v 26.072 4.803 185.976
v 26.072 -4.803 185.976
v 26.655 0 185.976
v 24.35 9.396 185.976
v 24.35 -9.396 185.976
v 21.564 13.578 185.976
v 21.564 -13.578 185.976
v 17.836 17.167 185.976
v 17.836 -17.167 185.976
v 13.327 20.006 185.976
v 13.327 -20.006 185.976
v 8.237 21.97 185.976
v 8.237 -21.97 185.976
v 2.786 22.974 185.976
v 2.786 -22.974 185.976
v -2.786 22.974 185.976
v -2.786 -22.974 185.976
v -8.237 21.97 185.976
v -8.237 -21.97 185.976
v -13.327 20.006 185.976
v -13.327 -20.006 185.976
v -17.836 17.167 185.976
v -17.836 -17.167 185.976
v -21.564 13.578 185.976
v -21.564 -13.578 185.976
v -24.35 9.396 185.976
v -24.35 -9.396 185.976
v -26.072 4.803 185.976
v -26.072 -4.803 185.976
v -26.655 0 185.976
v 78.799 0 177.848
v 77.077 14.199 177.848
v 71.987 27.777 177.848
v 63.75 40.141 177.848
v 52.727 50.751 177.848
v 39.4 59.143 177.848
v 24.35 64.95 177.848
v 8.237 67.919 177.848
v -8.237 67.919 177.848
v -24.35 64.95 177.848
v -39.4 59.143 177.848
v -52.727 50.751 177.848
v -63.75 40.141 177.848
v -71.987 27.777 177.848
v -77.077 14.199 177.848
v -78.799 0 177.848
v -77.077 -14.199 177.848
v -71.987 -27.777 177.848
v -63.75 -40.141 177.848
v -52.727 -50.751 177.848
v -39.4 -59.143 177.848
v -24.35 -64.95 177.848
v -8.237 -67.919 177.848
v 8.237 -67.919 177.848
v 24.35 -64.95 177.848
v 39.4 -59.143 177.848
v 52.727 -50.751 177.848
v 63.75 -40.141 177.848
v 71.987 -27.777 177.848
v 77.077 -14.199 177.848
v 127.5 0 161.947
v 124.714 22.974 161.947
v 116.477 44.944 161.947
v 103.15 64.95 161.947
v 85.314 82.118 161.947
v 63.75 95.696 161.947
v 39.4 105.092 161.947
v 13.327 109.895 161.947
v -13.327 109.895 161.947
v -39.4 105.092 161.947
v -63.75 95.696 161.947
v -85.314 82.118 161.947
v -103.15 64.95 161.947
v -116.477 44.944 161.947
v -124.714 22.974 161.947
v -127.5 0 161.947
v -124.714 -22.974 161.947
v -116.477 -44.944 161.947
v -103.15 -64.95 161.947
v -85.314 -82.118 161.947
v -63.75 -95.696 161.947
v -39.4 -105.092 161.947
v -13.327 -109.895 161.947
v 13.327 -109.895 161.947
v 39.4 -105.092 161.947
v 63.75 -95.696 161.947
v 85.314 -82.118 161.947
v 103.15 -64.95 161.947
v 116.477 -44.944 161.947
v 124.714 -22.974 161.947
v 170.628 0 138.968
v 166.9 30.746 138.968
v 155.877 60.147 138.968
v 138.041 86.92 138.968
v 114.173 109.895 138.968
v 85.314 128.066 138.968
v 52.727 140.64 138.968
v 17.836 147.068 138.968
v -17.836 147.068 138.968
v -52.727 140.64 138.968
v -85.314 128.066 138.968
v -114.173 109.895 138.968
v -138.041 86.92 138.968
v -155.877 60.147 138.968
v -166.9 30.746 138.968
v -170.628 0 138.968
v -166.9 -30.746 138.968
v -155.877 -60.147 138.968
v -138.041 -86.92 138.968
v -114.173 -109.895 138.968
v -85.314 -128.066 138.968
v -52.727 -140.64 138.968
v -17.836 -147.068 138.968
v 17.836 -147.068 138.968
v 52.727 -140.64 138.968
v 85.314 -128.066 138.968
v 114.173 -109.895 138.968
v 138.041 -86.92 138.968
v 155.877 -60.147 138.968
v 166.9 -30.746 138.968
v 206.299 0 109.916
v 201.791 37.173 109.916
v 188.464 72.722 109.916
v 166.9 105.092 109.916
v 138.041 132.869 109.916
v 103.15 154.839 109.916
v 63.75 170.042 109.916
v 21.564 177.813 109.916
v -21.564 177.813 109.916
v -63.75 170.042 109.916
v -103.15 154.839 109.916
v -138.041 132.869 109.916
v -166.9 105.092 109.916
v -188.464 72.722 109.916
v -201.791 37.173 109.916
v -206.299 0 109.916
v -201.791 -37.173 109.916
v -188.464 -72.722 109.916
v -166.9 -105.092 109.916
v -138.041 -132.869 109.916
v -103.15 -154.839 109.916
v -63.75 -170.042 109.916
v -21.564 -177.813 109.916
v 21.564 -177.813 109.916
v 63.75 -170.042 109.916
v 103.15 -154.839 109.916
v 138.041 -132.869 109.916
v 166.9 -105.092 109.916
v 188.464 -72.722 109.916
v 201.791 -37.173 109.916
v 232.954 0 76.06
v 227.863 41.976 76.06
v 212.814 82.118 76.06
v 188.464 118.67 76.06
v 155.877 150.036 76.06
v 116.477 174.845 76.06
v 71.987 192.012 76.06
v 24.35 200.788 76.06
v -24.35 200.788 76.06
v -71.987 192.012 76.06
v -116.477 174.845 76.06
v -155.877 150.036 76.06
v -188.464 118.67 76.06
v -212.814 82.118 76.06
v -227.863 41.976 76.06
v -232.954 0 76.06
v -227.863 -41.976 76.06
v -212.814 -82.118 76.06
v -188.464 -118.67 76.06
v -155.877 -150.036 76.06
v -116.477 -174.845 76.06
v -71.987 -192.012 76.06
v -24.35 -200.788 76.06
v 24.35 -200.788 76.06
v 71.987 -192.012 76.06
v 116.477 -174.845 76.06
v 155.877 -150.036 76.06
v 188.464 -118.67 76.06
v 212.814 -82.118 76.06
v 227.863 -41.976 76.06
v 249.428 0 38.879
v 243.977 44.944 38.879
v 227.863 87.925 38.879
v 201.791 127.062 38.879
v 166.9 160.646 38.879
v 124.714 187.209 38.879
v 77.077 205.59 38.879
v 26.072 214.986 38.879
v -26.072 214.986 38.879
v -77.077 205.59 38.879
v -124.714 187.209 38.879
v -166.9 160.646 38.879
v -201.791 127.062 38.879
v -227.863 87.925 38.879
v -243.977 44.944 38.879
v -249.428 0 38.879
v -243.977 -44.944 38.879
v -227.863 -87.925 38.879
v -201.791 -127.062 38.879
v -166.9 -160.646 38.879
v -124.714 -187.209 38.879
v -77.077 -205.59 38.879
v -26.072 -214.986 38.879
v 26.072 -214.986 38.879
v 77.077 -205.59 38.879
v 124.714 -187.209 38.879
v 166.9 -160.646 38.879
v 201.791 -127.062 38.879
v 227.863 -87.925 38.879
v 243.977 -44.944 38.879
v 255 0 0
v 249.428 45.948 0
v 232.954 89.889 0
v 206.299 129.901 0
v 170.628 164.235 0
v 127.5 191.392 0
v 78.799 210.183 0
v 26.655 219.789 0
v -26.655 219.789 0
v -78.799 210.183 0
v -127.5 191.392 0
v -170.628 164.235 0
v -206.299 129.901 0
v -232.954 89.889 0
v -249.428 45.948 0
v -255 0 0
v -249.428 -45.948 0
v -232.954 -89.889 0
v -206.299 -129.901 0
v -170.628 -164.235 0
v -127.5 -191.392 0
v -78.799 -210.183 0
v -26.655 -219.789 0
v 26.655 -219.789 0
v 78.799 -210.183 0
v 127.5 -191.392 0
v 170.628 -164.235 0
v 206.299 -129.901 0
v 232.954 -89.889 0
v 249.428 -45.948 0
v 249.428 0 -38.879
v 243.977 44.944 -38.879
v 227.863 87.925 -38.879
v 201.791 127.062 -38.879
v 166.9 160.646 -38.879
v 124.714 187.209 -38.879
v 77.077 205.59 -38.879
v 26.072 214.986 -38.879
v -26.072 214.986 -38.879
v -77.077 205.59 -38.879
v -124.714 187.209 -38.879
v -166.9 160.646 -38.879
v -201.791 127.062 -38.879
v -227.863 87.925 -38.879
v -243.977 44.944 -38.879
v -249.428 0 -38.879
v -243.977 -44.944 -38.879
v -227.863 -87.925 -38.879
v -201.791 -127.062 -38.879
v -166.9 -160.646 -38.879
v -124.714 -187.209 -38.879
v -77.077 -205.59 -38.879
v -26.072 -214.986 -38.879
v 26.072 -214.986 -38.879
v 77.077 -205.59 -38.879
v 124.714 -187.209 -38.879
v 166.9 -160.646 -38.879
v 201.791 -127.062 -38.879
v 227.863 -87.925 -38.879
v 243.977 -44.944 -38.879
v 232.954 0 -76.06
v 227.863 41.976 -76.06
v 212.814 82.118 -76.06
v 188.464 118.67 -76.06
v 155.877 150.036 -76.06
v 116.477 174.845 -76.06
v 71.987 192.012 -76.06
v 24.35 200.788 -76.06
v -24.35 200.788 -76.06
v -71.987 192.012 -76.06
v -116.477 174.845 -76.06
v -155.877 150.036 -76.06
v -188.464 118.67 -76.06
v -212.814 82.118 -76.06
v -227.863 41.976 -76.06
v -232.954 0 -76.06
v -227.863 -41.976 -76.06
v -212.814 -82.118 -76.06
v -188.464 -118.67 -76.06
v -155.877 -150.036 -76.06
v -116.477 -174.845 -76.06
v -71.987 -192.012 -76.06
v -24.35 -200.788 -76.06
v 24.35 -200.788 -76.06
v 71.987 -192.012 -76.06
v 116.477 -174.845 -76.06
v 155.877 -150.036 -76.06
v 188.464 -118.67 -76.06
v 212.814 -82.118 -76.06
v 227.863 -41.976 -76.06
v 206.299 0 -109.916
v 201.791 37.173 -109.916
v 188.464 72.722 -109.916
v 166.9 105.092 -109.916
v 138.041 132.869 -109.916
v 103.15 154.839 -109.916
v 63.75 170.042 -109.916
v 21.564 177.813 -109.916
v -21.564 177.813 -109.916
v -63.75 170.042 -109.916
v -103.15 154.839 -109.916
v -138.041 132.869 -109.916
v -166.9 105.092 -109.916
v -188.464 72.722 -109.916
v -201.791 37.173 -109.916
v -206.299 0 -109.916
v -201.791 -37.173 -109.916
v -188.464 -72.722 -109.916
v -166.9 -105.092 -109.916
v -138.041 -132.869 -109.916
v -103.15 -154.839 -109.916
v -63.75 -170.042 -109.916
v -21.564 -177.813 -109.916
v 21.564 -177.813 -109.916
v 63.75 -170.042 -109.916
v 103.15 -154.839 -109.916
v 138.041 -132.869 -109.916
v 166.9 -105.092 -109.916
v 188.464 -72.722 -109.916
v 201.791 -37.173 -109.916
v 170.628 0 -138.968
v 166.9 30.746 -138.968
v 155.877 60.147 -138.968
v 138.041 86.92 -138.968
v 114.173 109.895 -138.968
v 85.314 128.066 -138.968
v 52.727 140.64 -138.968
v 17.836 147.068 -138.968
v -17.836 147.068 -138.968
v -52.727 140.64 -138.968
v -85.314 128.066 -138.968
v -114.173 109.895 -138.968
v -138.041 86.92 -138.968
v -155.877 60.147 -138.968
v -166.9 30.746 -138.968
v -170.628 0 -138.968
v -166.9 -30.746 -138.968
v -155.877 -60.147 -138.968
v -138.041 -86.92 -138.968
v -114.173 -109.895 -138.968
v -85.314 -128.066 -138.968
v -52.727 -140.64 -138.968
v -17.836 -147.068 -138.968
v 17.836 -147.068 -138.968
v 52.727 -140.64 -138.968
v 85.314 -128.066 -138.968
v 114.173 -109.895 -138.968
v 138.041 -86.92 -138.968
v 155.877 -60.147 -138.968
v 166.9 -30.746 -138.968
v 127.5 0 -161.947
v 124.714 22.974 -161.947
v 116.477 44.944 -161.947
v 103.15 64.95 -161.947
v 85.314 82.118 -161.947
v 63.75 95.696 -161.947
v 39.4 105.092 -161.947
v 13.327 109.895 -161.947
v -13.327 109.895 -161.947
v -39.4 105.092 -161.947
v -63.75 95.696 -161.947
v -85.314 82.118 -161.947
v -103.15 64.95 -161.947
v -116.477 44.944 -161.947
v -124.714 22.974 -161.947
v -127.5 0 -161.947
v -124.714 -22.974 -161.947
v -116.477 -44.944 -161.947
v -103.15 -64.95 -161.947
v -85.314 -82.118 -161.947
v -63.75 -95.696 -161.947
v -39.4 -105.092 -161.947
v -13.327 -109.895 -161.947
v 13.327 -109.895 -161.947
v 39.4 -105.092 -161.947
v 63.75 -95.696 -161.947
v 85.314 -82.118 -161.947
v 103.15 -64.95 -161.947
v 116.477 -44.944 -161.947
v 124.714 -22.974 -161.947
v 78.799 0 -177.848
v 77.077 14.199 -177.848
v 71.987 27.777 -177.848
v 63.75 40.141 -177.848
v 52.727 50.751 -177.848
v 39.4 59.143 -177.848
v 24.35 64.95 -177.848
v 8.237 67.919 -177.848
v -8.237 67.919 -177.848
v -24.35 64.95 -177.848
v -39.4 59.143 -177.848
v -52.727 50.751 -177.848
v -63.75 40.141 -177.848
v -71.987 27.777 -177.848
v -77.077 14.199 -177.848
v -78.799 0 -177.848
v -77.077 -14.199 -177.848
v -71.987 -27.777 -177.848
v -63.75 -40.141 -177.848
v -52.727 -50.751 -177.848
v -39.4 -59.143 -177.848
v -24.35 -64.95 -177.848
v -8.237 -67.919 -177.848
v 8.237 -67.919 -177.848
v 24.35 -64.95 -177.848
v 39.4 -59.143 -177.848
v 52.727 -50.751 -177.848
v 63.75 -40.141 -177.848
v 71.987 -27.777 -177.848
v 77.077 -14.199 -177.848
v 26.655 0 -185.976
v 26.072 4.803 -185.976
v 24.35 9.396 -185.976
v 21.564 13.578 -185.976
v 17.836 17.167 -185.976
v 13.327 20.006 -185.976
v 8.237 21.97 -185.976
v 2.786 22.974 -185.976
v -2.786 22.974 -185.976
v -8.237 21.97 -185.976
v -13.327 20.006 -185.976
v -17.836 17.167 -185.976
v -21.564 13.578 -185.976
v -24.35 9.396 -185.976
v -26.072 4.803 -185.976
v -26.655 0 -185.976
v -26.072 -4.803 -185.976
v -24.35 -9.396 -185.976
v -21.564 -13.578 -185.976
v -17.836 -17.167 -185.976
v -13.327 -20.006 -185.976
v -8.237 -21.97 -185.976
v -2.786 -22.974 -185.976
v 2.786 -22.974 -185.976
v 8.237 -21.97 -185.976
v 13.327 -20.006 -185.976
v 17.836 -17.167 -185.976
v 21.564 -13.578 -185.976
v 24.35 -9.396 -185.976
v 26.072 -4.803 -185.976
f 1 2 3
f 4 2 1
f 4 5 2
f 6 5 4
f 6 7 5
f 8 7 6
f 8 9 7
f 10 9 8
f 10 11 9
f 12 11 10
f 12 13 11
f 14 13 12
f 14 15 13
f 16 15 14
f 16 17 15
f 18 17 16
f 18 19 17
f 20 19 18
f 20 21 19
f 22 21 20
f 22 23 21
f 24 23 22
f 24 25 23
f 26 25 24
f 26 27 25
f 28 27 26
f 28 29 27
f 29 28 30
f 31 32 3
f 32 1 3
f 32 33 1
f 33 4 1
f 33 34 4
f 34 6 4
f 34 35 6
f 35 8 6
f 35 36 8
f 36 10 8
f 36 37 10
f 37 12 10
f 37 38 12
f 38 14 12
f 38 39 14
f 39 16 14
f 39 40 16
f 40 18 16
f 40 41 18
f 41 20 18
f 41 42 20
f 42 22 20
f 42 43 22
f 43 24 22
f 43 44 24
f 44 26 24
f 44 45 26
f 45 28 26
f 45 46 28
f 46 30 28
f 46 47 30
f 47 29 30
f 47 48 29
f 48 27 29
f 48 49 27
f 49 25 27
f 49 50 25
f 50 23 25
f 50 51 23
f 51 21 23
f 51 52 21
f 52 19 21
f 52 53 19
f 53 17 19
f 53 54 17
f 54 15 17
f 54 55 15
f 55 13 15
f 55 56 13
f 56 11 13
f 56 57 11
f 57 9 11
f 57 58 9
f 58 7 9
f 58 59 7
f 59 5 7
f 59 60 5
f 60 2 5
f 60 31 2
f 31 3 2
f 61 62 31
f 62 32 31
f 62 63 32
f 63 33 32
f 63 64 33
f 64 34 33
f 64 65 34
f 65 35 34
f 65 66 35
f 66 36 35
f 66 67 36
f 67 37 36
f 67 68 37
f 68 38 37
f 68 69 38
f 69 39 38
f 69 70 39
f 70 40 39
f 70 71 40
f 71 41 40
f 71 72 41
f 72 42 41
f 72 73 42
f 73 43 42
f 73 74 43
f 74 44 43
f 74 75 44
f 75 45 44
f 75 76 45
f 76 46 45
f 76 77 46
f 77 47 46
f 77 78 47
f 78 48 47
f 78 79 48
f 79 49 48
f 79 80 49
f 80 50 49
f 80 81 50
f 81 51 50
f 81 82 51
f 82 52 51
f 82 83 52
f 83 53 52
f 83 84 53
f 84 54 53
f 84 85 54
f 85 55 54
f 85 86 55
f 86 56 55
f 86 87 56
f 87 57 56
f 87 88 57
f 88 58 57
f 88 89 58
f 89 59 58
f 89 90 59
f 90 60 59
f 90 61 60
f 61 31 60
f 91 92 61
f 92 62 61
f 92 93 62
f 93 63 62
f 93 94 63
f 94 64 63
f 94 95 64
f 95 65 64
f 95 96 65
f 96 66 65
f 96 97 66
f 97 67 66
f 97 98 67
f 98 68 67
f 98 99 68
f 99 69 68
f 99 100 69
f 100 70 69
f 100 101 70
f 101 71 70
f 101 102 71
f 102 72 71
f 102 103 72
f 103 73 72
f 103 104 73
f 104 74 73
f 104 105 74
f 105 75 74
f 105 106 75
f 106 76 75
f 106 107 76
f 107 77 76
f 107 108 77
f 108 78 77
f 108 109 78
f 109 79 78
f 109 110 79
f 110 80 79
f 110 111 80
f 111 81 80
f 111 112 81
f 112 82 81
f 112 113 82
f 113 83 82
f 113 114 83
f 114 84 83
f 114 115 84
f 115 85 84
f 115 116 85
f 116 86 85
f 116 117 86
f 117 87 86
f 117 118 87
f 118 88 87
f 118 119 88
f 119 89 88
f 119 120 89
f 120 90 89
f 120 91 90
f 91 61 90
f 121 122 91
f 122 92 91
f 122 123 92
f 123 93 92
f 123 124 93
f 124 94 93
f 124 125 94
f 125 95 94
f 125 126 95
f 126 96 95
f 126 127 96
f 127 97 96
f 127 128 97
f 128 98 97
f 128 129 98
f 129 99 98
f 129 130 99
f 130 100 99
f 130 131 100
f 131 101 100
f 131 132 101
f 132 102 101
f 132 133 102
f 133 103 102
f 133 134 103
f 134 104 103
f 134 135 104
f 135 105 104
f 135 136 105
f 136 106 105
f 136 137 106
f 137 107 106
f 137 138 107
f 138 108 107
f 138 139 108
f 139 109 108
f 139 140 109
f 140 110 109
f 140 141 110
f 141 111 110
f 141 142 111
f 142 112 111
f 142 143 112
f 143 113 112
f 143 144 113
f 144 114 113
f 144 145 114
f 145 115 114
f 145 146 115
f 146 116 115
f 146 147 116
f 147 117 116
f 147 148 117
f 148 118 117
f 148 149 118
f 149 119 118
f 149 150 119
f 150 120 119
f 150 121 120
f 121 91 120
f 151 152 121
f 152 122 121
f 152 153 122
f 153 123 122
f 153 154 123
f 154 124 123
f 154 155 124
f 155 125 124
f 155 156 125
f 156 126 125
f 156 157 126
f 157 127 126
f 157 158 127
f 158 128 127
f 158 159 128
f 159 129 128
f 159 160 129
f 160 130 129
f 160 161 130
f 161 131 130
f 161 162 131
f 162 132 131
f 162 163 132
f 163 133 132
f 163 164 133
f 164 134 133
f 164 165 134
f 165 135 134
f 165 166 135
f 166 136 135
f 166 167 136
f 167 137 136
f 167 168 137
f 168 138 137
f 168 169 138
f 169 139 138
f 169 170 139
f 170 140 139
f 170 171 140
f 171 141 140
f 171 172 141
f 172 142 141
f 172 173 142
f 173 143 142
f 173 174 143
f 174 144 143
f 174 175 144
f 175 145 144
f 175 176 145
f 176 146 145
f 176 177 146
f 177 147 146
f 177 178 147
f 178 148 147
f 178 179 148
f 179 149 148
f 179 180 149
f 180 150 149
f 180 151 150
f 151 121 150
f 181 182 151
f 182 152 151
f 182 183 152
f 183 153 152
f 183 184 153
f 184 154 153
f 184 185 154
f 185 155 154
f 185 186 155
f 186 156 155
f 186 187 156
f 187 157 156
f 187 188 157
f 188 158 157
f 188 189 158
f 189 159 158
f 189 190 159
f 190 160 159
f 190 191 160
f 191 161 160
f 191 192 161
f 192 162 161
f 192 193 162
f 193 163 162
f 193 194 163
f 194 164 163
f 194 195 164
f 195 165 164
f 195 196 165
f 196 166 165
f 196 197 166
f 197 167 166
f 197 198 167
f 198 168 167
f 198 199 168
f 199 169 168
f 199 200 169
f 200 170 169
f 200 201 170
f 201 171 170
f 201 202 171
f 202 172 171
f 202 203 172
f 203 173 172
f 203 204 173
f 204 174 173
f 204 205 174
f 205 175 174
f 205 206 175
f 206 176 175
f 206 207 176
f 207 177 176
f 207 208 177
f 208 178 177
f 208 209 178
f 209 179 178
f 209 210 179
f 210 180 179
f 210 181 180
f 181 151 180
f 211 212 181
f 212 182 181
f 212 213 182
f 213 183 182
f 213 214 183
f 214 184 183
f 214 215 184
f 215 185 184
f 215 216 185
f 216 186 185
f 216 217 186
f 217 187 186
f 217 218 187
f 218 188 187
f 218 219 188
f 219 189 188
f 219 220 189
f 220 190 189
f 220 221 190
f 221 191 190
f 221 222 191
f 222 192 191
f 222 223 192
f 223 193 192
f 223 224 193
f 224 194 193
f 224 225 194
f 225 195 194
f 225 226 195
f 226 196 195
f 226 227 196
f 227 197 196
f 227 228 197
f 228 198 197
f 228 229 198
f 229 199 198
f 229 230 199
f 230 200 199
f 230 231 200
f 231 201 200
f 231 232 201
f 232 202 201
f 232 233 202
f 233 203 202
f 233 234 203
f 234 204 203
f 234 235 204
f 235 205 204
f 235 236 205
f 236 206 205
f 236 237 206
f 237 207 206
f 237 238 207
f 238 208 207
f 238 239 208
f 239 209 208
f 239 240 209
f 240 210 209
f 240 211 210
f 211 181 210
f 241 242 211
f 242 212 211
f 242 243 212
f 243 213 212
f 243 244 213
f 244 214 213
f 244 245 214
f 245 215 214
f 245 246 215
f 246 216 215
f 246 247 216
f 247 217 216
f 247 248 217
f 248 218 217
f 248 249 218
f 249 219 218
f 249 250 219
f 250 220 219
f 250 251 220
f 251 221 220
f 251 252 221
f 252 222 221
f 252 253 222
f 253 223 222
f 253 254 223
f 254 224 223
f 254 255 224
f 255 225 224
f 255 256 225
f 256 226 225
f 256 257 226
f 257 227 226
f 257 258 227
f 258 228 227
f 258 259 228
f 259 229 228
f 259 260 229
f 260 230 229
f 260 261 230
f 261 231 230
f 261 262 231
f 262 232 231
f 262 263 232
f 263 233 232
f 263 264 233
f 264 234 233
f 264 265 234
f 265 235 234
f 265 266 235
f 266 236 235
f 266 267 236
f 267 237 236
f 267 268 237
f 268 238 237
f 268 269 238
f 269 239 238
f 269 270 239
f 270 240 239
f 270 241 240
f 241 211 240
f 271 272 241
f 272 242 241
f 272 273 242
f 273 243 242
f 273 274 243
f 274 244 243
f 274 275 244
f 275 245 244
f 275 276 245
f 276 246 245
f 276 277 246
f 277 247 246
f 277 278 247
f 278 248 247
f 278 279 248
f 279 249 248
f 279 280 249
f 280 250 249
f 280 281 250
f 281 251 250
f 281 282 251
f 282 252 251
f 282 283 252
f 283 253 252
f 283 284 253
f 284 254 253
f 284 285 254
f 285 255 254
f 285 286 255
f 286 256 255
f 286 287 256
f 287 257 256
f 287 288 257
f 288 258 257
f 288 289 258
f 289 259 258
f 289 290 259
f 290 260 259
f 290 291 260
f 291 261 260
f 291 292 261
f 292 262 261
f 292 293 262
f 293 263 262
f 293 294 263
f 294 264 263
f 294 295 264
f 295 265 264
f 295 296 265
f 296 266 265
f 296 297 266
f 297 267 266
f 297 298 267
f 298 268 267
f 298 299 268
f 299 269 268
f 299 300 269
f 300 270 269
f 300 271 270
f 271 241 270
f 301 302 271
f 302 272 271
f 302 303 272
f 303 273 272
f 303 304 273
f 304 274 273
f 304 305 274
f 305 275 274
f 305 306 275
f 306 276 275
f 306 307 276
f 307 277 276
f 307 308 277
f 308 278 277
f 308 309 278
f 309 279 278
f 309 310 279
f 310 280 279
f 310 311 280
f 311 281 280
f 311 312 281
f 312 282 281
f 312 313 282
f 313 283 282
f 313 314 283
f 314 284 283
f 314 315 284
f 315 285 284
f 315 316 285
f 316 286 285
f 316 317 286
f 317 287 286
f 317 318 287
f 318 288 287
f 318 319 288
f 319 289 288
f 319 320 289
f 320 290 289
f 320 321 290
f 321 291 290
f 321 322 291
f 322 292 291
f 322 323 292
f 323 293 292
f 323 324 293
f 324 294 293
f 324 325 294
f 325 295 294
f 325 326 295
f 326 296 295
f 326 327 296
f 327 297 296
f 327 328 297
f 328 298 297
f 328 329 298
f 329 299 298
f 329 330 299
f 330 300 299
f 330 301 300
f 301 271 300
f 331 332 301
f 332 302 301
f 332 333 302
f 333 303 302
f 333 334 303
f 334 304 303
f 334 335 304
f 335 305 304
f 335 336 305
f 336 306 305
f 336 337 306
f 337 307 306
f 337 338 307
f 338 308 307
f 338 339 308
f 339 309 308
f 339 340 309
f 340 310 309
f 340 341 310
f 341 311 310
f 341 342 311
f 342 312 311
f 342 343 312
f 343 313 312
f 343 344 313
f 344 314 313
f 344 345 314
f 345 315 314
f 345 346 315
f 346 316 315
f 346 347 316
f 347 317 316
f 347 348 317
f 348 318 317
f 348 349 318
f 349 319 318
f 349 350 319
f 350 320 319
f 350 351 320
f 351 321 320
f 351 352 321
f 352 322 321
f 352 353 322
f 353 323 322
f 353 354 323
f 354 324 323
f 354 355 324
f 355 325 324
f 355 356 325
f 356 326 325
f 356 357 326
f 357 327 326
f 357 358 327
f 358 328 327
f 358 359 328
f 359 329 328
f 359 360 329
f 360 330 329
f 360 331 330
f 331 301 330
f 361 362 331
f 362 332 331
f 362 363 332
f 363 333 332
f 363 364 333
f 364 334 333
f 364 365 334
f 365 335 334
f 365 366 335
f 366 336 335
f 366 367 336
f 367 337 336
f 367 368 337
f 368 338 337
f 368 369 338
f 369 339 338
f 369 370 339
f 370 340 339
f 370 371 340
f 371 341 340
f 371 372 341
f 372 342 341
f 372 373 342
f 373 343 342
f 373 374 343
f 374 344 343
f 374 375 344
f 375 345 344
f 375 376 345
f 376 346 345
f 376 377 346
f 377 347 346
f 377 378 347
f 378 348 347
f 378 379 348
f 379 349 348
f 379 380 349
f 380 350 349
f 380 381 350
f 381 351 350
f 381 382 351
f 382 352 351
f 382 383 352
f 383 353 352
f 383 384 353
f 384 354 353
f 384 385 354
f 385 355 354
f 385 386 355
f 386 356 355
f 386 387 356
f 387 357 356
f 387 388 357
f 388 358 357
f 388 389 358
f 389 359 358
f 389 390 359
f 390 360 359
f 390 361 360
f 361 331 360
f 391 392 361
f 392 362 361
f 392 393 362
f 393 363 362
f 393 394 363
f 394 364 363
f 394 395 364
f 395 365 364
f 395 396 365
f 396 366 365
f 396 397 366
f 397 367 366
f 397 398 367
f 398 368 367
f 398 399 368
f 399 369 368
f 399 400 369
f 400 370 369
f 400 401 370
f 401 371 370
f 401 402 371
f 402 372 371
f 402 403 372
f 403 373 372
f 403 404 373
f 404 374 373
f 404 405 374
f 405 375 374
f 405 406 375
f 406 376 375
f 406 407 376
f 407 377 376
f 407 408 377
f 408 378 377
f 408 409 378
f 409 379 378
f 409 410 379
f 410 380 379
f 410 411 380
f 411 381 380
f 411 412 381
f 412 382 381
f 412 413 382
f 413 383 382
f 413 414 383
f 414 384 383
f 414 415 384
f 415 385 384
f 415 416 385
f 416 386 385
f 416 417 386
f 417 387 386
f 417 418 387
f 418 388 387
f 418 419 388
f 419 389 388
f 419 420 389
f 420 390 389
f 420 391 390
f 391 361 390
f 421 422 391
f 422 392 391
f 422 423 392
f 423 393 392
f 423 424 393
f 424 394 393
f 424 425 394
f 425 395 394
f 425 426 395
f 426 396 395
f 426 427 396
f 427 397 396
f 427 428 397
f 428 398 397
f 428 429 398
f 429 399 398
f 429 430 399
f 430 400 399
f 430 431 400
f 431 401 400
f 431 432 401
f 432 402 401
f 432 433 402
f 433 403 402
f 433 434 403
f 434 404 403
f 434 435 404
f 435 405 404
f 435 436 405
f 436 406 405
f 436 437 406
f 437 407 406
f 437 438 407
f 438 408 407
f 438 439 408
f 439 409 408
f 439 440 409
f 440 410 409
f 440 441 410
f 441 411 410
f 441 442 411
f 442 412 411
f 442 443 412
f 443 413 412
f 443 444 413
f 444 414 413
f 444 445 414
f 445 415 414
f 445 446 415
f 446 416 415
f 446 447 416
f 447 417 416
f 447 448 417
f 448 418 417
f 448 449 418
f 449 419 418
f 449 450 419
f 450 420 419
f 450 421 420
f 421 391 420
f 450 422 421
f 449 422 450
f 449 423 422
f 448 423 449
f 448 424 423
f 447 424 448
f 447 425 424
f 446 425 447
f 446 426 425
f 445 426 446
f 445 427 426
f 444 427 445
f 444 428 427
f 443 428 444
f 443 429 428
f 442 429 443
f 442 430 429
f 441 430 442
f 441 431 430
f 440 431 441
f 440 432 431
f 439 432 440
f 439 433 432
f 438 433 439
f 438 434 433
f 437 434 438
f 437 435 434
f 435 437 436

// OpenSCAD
// Generated by SolidPython 1.0.1 on 2020-07-29 00:46:52


scale(v = [15, 13, 11]) {
	sphere(r = 17);
}
/***********************************************
*********      SolidPython code:      **********
************************************************
 
# import packages: SolidPython
from solid import *
from solid.utils import *
from itertools import chain, combinations, permutations


class Resize:

    def __init__(self, scad_file):
        self.scad_file = scad_file
        #self.scad_file = import_scad(scad_file)
        # cone/cylinder param:
        self.r1 = 0
        self.r2 = 0
        self.h = 0
        # rectangular prism param:
        self.w = 0
        self.l = 0
        # ellipse param:
        self.r = 0

    # import OpenScad code (file name corresponds to shape)


    # classify shape + parameters
    def assign(self, param1, param2, param3):
        if self.scad_file == 'cone.scad':
            self.r1 = param1
            self.r2 = param2
            self.h = param3
        elif self.scad_file == 'cylinder.scad':
            self.r1 = param1
            self.r2 = param2
            self.h = param3
        elif self.scad_file == 'rectangularPrism.scad':
            self.h = param1
            self.l = param2
            self.w = param3
        else:
            self.r = param1
            self.h = param2

    # resize parameters
    def iterate(self):
        x = range(3, 20, 2)
        i = 1
        if self.scad_file == 'cone.scad':
            tempList = list(permutations(x, 2))
            for temp in tempList:
                param1 = temp[0]
                param2 = temp[1]
                filepath = 'produced_scad_files/' + 'cone' + str(param1) + '_' + str(param2) + '_' + '.scad'
                scad_render_to_file(cylinder(h=param1, r1=param2, r2=0), filepath)

        elif self.scad_file == 'cylinder.scad':
            tempList = list(permutations(x, 3))
            for temp in tempList:
                param1 = temp[0]
                param2 = temp[1]
                filepath = 'produced_scad_files/' + 'cylinder' + str(param1) + '_' + str(param2) + '_' + '.scad'
                scad_render_to_file(cylinder(h=param1, r1=param2, r2=param2), filepath)

        elif self.scad_file == 'rectangularPrism.scad':
            tempList = list(permutations(x, 3))
            for temp in tempList:
                param1 = temp[0]
                param2 = temp[1]
                param3 = temp[2]
                filepath = 'produced_scad_files/' + 'rectangularPrism' + str(param1) + '_' + str(param2) + '_' + str(
                    param3) + '.scad'
                scad_render_to_file(cube(size=(param1, param2, param3)), filepath)

        elif self.scad_file == 'ellipse.scad':
            tempList = list(permutations(x, 4))
            for temp in tempList:
                param1 = temp[0]
                param2 = temp[1]
                param3 = temp[2]
                param4 = temp[3]
                filepath = 'produced_scad_files/' + 'ellipse' + str(param1) + '_' + str(param2) + '_' + str(param3) + '_' + str(param4) + '.scad'
                scad_render_to_file(scale([param1, param2, param3])(sphere(r=param4)), filepath)

    def render_to_scadfile(self):
        scad_render_to_file(scad, 'example.scad') 
 
************************************************/
